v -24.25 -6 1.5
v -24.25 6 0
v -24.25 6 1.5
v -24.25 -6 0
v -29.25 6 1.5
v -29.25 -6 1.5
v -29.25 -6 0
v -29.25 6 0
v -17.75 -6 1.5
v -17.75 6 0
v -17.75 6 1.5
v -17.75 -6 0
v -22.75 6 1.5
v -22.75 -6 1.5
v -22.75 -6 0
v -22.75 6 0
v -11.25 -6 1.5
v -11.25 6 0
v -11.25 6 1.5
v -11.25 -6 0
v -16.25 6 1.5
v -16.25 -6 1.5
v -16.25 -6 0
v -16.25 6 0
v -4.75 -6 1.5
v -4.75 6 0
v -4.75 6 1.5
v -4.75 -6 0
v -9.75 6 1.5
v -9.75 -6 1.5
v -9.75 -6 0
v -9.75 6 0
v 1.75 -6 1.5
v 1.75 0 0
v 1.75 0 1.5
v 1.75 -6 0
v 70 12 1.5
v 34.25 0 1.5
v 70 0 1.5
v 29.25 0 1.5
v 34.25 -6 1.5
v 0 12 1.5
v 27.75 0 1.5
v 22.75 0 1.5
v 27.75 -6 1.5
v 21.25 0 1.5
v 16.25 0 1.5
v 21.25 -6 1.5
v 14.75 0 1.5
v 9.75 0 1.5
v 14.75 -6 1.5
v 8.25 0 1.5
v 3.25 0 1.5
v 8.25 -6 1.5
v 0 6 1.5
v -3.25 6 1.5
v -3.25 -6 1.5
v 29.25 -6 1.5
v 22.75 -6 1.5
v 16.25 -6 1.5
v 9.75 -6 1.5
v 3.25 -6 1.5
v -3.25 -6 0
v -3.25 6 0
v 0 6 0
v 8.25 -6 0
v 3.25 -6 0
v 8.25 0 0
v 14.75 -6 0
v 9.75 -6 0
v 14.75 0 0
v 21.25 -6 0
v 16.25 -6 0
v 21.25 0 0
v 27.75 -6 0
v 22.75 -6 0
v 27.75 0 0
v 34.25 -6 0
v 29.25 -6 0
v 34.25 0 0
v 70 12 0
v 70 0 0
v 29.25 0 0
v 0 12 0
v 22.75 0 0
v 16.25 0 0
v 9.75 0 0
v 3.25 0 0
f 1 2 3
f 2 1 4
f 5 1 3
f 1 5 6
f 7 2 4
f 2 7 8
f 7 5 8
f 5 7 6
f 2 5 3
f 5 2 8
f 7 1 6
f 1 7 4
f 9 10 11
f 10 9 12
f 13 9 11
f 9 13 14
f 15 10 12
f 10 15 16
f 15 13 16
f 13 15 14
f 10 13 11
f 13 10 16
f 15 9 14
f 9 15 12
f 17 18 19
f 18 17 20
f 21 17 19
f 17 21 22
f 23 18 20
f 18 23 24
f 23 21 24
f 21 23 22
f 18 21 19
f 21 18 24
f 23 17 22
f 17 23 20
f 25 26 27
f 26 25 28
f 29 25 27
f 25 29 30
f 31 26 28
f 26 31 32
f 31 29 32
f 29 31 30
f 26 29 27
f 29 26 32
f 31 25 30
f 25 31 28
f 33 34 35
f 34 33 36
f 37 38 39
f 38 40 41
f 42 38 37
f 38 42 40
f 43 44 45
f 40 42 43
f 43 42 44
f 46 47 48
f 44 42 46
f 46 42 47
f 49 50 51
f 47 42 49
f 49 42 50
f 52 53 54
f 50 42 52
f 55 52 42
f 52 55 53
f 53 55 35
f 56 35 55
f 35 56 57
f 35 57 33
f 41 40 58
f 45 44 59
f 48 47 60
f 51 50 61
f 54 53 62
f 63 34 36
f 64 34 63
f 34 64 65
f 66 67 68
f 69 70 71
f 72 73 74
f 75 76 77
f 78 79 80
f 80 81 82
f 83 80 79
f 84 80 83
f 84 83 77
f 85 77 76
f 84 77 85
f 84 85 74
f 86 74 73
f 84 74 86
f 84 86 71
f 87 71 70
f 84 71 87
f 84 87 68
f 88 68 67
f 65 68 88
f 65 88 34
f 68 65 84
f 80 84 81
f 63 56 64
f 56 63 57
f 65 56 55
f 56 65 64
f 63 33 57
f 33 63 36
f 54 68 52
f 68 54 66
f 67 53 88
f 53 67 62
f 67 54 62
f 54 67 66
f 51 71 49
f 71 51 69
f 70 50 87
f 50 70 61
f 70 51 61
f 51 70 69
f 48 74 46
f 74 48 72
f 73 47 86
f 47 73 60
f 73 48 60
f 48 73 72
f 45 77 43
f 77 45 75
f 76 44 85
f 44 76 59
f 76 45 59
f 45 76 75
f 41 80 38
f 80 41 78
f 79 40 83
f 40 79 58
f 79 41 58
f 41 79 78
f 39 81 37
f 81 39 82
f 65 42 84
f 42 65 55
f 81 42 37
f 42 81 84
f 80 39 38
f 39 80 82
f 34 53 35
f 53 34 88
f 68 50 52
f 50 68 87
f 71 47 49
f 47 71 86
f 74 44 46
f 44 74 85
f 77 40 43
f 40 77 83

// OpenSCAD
// --- Dimensions ---
// Thickness of the plate (Z-axis)
plate_thickness = 1.5;

// Spine dimensions (X, Y)
spine_length = 70;
spine_width = 12;

// Tooth dimensions (X, Y)
tooth_width = 5.0;
tooth_length = 12;

// Gap between teeth
gap_width = 1.5;

// Number of teeth
num_teeth = 10;

// --- Calculated Values ---
// Total width of the tooth row (teeth + gaps)
// There are 10 teeth and 9 gaps between them.
tooth_row_width = (num_teeth * tooth_width) + ((num_teeth - 1) * gap_width);

// Centering offset for the teeth relative to the spine center
// The teeth hang in the -Y direction.
// The spine is centered at X=0.
// The tooth row is centered at X=0.
// The spine extends from -spine_width/2 to +spine_width/2 in Y.
// The teeth start at the bottom edge of the spine (Y = -spine_width/2) and extend further in -Y.

// --- Helper: Single Tooth ---
// A tooth is a rectangle hanging from the spine.
// Spine bottom edge is at Y = -spine_width/2.
// Tooth extends from Y = -spine_width/2 to Y = -(spine_width/2 + tooth_length).
// Width is tooth_width.
// We will position each tooth using a for loop.

// Start X position for the first tooth
// The total width of the tooth row is tooth_row_width.
// Centered at X=0, the first tooth starts at:
start_x = -(tooth_row_width / 2);

// Step between teeth (width + gap)
step_x = tooth_width + gap_width;

// Extrusion depth for boolean operations to ensure clean cuts
extrude_depth = 0.05;

// Set global resolution
$fn = 64;

// --- Main Model ---
union() {
    // 1. The Spine
    // Centered at origin, lying on XY plane.
    // X: -spine_length/2 to +spine_length/2
    // Y: -spine_width/2 to +spine_width/2
    // Z: 0 to plate_thickness
    translate([0, 0, 0]) {
        cube([spine_length, spine_width, plate_thickness], center = false);
    }

    // 2. The Teeth
    // Each tooth hangs from the bottom edge of the spine (Y = -spine_width/2).
    // They extend in the -Y direction.
    for (i = [0 : num_teeth - 1]) {
        // Calculate X position for the current tooth
        // Center of the tooth
        tooth_center_x = start_x + (i * step_x) + (tooth_width / 2);
        
        // Y position: 
        // Top of tooth is at Y = -spine_width/2
        // Bottom of tooth is at Y = -spine_width/2 - tooth_length
        tooth_y_start = -spine_width / 2;
        tooth_y_end = -spine_width / 2 - tooth_length;
        
        // Translate to the center of the tooth in X, and the top edge in Y
        // We want the tooth to be printed as part of the solid.
        // The tooth is a block of size [tooth_width, tooth_length, plate_thickness]
        // positioned such that its top edge aligns with the spine's bottom edge.
        
        translate([tooth_center_x, tooth_y_start, 0]) {
            cube([tooth_width, tooth_length, plate_thickness], center = false);
        }
    }
}
